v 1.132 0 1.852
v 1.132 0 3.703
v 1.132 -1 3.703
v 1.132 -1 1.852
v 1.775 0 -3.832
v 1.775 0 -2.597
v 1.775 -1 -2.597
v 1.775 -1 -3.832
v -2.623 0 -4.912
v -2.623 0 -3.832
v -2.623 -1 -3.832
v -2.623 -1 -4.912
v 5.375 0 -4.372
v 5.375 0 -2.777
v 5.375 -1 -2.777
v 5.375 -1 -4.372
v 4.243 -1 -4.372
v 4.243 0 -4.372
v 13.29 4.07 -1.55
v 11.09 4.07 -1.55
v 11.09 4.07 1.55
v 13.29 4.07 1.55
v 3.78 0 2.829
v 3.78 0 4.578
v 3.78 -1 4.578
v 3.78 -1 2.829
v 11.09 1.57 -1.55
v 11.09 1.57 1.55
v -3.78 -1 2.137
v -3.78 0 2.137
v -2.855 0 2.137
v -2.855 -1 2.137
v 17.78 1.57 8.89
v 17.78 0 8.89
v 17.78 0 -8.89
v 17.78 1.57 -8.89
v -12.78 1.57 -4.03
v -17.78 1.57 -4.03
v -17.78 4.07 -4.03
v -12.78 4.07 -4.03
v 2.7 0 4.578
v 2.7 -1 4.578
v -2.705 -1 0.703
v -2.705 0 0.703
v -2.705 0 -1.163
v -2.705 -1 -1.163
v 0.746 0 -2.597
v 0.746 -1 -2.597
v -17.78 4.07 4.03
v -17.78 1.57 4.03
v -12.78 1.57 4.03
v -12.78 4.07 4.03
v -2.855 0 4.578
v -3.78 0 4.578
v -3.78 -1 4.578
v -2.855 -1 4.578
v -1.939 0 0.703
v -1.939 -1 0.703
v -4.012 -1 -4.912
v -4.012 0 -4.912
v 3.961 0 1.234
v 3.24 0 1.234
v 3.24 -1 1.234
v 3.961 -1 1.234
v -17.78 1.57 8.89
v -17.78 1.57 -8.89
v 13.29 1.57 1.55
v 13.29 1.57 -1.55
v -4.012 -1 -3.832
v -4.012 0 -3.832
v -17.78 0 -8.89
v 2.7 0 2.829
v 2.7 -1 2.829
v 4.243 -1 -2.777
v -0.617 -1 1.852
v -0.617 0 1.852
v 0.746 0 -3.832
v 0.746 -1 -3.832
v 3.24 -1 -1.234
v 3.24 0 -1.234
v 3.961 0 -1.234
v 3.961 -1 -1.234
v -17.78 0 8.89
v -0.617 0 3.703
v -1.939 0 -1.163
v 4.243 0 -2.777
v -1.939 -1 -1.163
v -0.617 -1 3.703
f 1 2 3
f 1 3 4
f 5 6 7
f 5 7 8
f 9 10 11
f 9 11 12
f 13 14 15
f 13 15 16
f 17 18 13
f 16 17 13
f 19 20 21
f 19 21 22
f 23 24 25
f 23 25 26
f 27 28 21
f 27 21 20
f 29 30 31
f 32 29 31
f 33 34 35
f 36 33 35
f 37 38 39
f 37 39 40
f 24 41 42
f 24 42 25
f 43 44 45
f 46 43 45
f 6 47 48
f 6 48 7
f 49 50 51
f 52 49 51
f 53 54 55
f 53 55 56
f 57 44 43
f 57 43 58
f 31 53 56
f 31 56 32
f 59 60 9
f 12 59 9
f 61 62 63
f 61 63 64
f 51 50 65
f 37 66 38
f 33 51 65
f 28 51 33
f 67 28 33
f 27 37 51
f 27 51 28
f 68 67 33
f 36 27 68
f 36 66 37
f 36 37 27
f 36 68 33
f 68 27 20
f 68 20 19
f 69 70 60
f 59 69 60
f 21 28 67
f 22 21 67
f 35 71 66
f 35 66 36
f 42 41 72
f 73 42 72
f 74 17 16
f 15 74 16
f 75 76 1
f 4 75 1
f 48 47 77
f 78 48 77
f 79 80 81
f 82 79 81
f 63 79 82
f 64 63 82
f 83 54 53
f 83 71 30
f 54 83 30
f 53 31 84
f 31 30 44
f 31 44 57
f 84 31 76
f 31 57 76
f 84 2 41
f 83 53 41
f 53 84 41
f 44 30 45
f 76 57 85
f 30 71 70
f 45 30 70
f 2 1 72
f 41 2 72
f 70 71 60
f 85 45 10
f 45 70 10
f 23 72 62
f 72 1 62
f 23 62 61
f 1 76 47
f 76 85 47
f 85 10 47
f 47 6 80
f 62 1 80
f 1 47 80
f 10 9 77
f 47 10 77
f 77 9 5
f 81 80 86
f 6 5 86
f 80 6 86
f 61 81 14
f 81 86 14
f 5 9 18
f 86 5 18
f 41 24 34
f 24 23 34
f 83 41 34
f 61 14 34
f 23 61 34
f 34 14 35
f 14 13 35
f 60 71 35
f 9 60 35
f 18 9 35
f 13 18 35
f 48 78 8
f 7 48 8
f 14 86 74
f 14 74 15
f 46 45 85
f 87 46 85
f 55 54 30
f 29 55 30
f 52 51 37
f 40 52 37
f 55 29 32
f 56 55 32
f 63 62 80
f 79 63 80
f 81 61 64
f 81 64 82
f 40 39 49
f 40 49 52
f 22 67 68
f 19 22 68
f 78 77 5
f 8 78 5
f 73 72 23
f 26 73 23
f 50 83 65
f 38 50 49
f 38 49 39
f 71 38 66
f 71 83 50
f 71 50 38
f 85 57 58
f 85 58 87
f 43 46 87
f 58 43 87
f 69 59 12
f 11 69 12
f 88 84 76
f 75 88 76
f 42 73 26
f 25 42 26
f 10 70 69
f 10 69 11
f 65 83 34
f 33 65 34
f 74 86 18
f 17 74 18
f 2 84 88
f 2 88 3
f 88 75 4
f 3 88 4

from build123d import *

# Parameters (mm, degrees)
SKETCH1_W           = 35.56
SKETCH1_H           = 17.78
BOARD_DEPTH         = 1.57
SKETCH2_W           = 5
SKETCH2_H           = 8.06
MICROUSB_DEPTH      = 2.5
SKETCH3_W           = 2.2
SKETCH3_H           = 3.1
BUTTON_DEPTH        = 2.5
SKETCH4_W           = 1.388748629
SKETCH4_H           = 1.080137823
SKETCH4_W_2         = 1.028702689
SKETCH4_H_2         = 1.234443227
SKETCH4_W_3         = 1.131572957
SKETCH4_H_3         = 1.594489167
SKETCH4_W_4         = 0.720091882
SKETCH4_H_4         = 2.468886452
SKETCH4_W_5         = 1.74879457
SKETCH4_H_5         = 1.85166484
SKETCH4_W_6         = 0.925832419
SKETCH4_H_6         = 2.441025755
SKETCH4_W_7         = 0.76580757
SKETCH4_H_7         = 1.866499914
SKETCH4_W_8         = 1.080137823
SKETCH4_H_8         = 1.748794571
BOSS_EXTRUDE1_DEPTH = 1


with BuildPart() as part:
    # Sketch1 → Board (new body)
    with BuildSketch(Plane(origin=(0, 0, 0), x_dir=(1, 0, 0), z_dir=(0, 1, 0))):
        Rectangle(SKETCH1_W, SKETCH1_H)
    extrude(amount=BOARD_DEPTH)

    # Sketch2 → MicroUSB (add)
    with BuildSketch(Plane(origin=(0, 1.57, 0), x_dir=(1, 0, 0), z_dir=(0, 1, 0))):
        with Locations((-15.28, 0)):
            Rectangle(SKETCH2_W, SKETCH2_H)
    extrude(amount=MICROUSB_DEPTH)

    # Sketch3 → Button (add)
    with BuildSketch(Plane(origin=(0, 1.57, 0), x_dir=(1, 0, 0), z_dir=(0, 1, 0))):
        with Locations((12.19, 0)):
            Rectangle(SKETCH3_W, SKETCH3_H)
    extrude(amount=BUTTON_DEPTH)

    # Sketch4 → Boss-Extrude1 (add)
    with BuildSketch(Plane(origin=(0, 0, 0), x_dir=(1, 0, 0), z_dir=(0, 1, 0))):
        with Locations((-3.317566171, 4.371986427)):
            Rectangle(SKETCH4_W, SKETCH4_H)
        with Locations((1.260160794, 3.214695902)):
            Rectangle(SKETCH4_W_2, SKETCH4_H_2)
        with Locations((4.809185068, 3.574741842)):
            Rectangle(SKETCH4_W_3, SKETCH4_H_3)
        with Locations((3.60045941, 0)):
            Rectangle(SKETCH4_W_4, SKETCH4_H_4)
        with Locations((0.257175672, -2.777497259)):
            Rectangle(SKETCH4_W_5, SKETCH4_H_5)
        with Locations((-3.317566171, -3.357214086)):
            Rectangle(SKETCH4_W_6, SKETCH4_H_6)
        with Locations((-2.32174824, 0.229771707)):
            Rectangle(SKETCH4_W_7, SKETCH4_H_7)
        with Locations((3.240413468, -3.703329679)):
            Rectangle(SKETCH4_W_8, SKETCH4_H_8)
    extrude(amount=-BOSS_EXTRUDE1_DEPTH)


solid = part.part
